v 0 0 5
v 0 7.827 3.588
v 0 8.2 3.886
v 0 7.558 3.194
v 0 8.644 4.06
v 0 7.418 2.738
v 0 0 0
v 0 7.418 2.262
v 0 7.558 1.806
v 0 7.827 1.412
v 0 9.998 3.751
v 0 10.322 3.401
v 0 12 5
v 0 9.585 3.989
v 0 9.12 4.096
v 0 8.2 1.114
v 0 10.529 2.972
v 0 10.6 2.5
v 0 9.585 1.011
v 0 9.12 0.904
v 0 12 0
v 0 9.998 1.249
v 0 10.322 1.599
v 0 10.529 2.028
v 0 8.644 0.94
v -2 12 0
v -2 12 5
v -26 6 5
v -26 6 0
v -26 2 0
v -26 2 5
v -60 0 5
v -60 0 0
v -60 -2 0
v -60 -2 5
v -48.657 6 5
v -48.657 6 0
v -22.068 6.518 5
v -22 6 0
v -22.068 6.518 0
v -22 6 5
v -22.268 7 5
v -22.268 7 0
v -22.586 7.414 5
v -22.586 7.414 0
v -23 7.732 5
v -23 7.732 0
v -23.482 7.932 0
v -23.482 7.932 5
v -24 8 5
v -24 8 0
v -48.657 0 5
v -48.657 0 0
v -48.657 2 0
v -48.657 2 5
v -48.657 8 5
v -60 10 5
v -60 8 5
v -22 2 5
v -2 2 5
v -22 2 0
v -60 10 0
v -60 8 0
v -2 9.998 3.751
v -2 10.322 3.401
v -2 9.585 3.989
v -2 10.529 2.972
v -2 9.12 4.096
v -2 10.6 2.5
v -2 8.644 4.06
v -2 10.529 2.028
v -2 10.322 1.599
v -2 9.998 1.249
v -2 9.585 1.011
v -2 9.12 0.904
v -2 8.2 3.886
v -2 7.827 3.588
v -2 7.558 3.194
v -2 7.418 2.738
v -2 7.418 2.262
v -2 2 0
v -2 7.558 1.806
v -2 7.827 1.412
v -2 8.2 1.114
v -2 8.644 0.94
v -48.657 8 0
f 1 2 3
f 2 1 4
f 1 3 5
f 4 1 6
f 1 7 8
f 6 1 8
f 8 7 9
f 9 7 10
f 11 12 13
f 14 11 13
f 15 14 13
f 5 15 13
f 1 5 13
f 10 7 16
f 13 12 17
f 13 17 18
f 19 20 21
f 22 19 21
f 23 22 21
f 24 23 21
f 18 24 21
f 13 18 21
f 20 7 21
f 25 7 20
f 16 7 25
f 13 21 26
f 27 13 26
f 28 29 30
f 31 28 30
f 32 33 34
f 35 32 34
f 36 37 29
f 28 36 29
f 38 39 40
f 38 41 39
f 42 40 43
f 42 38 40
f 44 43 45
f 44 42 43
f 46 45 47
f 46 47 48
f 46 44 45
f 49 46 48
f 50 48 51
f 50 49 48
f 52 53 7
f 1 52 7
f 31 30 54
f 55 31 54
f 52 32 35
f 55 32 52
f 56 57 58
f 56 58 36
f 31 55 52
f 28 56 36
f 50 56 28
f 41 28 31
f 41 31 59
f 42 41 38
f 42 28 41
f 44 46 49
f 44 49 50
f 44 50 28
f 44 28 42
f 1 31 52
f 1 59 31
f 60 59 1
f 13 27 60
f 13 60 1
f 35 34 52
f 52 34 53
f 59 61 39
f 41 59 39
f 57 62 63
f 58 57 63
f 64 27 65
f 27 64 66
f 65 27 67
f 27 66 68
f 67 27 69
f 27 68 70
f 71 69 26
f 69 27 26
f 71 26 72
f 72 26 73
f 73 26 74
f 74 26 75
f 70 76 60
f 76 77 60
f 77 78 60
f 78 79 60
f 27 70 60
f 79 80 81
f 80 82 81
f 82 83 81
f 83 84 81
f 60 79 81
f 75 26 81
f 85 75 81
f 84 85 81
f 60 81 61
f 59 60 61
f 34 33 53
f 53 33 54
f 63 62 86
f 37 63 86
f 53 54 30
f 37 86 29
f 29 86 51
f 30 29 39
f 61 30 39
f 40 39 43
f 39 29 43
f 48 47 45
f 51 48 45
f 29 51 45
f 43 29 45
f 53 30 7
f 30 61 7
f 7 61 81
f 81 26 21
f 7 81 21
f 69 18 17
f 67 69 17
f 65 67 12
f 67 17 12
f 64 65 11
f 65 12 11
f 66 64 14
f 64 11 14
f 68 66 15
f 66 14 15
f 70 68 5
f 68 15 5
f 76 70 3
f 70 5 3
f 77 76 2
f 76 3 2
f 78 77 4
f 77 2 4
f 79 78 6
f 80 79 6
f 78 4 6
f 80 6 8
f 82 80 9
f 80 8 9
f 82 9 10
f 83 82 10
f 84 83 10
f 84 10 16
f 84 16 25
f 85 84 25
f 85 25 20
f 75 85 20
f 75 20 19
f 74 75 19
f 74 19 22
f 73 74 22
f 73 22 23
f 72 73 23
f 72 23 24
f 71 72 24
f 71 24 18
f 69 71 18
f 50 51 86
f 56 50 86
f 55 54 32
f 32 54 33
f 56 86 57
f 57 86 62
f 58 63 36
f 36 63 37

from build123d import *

# Parameters (mm, degrees)
F1_DEPTH = 5
F2_R     = 1.6
F3_DEPTH = 3
F4_R     = 2


with BuildPart() as f1:
    # F0 (on Top) → F1 (new body)
    with BuildSketch(Plane.XY):
        Polygon((-48.657436, 0), (0, 0), (0, 12), (-2, 12), (-2, 2), (-22, 2), (-22, 8), (-48.657436, 8), (-60, 10), (-60, 8), (-48.657436, 6), (-26, 6), (-26, 2), (-48.657436, 2), (-60, 0), (-60, -2), align=None)
    extrude(amount=F1_DEPTH)

    # F2 (on face) → F3 (cut)
    with BuildSketch(Plane.YZ):
        with Locations((9, 2.5)):
            Circle(F2_R)
    extrude(amount=-F3_DEPTH, mode=Mode.SUBTRACT)

    # F4
    f4_edges = [f1.edges().sort_by_distance(p)[0] for p in [
        (-22, 8, 2.5),
    ]]
    fillet(f4_edges, radius=F4_R)


solid = f1.part
